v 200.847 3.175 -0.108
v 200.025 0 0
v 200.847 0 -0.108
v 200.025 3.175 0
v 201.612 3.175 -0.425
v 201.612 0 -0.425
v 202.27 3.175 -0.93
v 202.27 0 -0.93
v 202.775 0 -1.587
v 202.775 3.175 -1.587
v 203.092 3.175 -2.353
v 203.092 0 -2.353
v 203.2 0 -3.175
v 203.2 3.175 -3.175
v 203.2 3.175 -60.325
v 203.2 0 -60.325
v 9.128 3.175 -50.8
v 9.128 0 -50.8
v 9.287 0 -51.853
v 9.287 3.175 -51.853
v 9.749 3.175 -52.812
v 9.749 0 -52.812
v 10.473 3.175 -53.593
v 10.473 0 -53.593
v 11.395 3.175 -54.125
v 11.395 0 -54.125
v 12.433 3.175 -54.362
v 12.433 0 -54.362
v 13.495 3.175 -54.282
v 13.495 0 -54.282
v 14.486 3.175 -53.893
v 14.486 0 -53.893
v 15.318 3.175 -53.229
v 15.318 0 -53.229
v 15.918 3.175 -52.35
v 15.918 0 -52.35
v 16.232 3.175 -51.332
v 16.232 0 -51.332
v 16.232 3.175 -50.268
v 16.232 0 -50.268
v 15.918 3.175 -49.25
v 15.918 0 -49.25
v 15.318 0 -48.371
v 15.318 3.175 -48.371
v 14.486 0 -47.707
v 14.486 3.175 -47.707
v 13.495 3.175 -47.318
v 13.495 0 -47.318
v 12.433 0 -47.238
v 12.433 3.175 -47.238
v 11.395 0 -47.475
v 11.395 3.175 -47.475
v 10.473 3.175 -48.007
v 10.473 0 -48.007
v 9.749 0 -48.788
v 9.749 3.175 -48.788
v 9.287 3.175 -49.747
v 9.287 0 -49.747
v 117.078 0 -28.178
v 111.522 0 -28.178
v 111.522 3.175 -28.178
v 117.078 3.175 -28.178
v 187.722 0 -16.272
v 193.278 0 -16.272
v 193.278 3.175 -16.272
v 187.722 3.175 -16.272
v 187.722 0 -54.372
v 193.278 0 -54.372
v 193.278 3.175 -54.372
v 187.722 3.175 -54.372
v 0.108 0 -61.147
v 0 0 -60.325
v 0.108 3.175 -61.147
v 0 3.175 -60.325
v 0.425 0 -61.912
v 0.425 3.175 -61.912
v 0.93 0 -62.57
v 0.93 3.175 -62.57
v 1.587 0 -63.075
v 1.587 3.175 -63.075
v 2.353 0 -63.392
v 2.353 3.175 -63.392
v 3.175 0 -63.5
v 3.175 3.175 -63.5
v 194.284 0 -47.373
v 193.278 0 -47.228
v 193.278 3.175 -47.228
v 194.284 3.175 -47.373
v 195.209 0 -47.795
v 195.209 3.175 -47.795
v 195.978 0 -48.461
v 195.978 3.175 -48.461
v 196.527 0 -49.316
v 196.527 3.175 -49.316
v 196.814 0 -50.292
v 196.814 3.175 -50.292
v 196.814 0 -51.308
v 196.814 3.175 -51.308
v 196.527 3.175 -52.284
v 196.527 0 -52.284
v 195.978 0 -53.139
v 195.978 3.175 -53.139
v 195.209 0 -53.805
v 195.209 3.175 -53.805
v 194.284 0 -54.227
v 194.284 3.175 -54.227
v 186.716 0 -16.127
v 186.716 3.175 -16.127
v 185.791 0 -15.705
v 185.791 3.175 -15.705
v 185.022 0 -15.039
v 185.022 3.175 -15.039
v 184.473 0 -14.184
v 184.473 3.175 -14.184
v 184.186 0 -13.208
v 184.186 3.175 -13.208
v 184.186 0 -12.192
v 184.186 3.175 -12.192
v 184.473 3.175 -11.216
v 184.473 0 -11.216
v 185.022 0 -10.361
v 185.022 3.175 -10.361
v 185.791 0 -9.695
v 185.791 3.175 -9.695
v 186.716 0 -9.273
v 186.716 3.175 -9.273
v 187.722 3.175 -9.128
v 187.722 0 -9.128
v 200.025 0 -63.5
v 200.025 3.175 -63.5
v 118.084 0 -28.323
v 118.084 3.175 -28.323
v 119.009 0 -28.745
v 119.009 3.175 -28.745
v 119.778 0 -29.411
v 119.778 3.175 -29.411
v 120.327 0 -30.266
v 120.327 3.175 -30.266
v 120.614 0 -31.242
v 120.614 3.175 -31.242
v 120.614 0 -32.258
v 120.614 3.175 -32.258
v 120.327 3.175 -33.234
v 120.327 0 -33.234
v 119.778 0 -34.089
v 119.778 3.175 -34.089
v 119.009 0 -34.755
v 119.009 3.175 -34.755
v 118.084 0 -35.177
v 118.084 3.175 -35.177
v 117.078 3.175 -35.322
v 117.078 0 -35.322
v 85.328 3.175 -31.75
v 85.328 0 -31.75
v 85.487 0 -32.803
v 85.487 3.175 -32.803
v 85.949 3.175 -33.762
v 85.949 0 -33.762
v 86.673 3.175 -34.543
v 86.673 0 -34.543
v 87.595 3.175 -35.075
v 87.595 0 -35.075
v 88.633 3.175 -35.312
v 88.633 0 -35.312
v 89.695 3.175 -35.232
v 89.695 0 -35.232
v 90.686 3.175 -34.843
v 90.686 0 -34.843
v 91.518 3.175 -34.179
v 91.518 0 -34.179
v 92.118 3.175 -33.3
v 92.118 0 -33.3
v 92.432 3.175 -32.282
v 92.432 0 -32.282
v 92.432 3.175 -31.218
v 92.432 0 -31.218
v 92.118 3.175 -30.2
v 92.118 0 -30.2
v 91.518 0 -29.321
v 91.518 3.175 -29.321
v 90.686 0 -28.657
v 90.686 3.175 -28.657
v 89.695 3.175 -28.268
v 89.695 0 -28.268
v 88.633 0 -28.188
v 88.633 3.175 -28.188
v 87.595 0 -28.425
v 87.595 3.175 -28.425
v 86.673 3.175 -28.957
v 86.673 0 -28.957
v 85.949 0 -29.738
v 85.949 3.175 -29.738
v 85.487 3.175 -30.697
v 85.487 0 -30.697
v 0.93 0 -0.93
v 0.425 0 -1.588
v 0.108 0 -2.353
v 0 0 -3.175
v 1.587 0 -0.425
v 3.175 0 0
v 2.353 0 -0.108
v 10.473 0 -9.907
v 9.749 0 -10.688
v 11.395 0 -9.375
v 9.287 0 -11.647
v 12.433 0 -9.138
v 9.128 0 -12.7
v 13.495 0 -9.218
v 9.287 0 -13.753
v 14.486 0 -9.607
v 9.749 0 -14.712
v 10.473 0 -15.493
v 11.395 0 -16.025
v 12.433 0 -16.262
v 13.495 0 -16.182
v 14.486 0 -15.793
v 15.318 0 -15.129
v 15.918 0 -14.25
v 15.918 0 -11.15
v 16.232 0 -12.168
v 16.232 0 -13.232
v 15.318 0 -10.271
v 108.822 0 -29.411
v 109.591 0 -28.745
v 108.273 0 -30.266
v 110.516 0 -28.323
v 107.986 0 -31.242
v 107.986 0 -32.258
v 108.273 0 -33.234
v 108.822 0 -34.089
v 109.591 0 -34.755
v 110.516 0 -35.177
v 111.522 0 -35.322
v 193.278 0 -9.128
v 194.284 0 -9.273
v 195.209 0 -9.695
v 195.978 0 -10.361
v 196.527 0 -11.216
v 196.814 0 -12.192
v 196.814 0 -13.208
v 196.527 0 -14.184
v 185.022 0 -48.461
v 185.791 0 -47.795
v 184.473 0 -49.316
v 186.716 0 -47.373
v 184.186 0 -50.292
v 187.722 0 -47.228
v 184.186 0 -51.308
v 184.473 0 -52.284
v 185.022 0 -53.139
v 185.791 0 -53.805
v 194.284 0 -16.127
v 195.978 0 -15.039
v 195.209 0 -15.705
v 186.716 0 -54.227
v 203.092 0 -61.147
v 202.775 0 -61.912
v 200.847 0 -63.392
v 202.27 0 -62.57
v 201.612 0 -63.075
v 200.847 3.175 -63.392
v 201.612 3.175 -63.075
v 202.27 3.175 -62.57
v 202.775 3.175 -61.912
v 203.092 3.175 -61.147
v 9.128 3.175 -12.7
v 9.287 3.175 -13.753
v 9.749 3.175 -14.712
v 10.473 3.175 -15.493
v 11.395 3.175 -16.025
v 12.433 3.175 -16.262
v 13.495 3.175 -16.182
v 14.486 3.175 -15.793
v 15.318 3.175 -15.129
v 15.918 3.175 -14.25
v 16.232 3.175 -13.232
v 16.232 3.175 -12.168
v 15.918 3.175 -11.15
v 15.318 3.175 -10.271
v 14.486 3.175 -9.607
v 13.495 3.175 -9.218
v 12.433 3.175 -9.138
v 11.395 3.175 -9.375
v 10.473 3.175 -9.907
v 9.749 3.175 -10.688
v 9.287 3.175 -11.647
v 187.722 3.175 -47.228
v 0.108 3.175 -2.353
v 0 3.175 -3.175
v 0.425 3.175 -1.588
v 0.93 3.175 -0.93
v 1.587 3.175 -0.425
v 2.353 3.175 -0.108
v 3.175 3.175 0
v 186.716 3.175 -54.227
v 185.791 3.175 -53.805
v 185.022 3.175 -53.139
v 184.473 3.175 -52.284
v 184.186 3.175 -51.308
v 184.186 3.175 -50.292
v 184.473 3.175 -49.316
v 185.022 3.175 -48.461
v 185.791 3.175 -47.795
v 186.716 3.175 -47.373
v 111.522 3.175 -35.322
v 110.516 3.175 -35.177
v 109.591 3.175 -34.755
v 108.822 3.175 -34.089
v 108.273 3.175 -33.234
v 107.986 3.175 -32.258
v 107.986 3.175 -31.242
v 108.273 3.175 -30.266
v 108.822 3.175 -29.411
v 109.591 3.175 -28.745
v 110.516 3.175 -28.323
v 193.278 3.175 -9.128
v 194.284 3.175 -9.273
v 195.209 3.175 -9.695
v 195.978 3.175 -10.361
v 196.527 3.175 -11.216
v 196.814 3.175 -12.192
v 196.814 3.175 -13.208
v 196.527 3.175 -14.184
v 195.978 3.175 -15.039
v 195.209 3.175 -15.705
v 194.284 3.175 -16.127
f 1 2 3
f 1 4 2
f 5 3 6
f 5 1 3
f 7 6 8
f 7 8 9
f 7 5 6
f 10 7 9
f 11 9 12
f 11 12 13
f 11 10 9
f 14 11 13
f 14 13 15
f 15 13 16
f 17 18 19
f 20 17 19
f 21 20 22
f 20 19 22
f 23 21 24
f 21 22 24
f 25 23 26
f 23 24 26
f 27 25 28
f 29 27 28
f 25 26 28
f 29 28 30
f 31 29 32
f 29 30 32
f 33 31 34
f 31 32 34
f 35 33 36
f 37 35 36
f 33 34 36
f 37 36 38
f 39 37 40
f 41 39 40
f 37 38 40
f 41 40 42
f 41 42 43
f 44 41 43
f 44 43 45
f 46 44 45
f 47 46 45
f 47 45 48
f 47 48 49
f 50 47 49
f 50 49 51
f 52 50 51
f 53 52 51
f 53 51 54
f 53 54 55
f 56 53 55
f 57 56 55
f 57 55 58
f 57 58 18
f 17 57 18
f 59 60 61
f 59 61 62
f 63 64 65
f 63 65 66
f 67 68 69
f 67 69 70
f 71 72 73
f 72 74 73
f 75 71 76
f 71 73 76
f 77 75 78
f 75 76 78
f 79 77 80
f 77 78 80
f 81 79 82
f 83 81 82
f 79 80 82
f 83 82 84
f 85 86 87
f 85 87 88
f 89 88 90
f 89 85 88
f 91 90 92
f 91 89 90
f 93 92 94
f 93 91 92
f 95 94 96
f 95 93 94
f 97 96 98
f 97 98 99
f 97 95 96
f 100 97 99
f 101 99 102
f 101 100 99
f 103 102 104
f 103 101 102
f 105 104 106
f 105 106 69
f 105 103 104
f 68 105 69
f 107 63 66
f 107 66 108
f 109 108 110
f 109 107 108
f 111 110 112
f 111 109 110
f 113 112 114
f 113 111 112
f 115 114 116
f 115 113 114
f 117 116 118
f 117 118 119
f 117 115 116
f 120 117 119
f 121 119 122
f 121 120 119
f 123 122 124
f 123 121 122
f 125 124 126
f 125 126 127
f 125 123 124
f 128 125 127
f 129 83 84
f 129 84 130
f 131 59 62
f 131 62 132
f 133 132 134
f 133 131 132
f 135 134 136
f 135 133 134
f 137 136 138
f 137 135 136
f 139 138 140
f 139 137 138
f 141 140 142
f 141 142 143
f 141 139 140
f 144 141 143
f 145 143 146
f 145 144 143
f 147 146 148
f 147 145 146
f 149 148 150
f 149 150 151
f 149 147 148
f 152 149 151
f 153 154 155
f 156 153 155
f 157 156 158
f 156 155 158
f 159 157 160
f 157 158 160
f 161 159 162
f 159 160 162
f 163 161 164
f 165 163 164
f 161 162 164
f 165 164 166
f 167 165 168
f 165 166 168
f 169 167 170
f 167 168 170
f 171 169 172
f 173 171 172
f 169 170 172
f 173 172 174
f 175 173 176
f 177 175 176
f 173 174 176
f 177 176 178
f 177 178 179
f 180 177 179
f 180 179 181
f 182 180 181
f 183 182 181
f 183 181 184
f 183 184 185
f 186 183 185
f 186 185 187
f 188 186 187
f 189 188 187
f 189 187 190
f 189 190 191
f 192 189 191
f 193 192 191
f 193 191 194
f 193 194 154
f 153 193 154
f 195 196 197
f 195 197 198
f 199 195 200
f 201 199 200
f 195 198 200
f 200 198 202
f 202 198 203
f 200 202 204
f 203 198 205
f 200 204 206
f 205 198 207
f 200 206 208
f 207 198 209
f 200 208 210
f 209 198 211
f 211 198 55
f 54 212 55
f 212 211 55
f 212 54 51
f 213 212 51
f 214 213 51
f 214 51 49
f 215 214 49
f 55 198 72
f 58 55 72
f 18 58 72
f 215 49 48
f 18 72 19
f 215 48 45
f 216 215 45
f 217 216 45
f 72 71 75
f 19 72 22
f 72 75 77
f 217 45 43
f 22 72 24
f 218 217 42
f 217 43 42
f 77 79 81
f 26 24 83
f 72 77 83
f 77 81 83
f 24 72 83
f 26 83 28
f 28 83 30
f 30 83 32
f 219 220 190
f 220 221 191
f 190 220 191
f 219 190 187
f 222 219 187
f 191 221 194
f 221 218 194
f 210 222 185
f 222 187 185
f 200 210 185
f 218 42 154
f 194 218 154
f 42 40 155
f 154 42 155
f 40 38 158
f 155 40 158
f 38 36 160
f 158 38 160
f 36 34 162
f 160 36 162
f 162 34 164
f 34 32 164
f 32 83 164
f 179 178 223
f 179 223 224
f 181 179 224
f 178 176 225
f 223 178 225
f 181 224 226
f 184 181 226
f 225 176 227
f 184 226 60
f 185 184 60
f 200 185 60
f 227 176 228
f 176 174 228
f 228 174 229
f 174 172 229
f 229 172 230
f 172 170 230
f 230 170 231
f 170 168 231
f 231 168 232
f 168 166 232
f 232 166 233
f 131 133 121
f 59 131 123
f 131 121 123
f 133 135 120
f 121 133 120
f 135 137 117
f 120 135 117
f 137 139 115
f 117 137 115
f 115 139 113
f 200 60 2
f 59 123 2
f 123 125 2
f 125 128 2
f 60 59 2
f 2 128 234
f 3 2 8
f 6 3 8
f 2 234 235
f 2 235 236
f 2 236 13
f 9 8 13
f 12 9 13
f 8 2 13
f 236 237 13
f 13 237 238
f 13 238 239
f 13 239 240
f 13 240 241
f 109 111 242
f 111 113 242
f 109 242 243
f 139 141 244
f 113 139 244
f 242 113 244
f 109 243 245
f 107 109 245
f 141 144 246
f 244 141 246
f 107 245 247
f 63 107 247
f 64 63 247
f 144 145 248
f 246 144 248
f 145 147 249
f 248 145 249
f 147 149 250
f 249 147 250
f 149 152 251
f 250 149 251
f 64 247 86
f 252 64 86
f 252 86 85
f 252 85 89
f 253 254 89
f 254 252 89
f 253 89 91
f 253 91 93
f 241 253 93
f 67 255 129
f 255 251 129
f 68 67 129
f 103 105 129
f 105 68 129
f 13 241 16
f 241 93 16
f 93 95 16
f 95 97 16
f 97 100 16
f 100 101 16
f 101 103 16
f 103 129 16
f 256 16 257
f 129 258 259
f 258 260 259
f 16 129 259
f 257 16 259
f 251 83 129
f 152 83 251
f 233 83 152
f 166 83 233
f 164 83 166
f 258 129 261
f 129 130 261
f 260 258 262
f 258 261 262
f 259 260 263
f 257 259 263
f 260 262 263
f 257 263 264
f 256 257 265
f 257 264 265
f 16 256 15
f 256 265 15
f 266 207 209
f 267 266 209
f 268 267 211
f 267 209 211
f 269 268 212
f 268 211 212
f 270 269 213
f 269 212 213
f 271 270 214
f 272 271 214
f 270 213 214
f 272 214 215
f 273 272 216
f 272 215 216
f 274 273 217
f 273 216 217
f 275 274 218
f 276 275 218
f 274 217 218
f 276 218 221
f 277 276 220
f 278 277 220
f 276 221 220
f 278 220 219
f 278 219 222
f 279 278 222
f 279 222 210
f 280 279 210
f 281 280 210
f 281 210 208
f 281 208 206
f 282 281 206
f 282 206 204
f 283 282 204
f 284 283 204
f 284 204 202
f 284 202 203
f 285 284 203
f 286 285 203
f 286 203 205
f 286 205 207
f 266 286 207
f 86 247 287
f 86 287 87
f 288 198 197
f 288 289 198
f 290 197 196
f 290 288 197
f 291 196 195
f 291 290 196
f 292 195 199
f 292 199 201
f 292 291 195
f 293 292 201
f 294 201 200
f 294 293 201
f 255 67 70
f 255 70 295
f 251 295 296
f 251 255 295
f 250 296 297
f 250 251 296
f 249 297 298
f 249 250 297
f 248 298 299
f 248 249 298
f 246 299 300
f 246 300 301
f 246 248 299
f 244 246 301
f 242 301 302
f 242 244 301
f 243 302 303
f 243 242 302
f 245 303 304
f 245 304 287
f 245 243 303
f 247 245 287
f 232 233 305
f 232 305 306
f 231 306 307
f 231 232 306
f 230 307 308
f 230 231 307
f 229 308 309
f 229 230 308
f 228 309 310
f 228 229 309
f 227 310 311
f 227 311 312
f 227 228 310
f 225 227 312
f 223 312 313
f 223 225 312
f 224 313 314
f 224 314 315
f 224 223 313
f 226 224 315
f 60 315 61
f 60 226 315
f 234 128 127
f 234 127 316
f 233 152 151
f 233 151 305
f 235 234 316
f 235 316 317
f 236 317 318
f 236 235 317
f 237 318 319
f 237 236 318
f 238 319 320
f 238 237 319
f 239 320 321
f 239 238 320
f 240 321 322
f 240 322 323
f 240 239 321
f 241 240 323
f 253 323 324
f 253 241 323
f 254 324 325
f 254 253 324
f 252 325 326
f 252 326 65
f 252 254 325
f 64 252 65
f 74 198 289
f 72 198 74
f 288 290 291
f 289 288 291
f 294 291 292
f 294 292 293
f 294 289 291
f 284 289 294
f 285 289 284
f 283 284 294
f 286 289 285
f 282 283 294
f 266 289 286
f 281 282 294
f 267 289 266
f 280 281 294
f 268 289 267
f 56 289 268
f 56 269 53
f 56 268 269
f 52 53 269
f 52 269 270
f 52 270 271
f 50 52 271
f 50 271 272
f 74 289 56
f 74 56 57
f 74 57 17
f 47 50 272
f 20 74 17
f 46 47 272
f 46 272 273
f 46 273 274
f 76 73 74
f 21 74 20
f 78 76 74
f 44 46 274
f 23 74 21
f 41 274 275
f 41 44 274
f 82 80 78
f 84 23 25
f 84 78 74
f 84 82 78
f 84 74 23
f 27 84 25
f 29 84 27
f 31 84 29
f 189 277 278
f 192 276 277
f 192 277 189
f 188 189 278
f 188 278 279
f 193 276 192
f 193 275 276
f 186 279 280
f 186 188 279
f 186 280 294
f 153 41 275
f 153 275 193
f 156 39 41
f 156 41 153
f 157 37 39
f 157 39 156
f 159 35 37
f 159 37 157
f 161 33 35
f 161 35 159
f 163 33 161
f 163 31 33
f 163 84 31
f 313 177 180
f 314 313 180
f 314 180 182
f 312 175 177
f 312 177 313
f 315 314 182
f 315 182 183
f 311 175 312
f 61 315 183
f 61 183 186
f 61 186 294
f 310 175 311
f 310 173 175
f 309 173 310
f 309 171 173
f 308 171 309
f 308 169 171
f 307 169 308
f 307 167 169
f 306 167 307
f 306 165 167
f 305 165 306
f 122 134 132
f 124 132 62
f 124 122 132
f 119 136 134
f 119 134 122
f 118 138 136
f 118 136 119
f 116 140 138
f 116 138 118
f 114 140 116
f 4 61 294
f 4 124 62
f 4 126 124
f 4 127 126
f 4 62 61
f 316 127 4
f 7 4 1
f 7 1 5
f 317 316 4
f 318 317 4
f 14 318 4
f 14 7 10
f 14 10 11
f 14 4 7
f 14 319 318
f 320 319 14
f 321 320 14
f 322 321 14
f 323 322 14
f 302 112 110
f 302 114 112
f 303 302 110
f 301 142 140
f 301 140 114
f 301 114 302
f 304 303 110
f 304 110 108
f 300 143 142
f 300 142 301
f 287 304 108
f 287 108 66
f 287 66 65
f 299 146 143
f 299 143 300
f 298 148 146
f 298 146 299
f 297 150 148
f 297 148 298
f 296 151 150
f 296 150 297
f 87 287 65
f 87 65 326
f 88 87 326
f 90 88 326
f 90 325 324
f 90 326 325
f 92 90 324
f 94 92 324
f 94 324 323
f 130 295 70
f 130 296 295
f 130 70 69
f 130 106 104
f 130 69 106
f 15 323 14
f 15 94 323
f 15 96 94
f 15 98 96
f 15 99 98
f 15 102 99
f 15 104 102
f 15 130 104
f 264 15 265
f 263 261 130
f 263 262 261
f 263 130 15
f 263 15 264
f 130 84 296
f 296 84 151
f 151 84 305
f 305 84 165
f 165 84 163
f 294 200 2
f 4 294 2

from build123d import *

# Parameters (mm, degrees)
SKETCH1_W                           = 203.2
SKETCH1_H                           = 63.5
BOSS_EXTRUDE1_DEPTH                 = 3.175
F_9_32_0_28125_DIAMETER_HOLE1_D     = 7.14375
F_9_32_0_28125_DIAMETER_SLOT1_DEPTH = 3.175
FILLET1_R                           = 3.175


# Read off the part's stored shape, not the designer's step: 9/32 (0.28125) Diameter Slot1
with BuildPart() as part:
    # Sketch1 → Boss-Extrude1 (new body)
    with BuildSketch(Plane(origin=(0, 0, 0), x_dir=(1, 0, 0), z_dir=(0, 1, 0))):
        with Locations((101.6, 31.75)):
            Rectangle(SKETCH1_W, SKETCH1_H)
    extrude(amount=BOSS_EXTRUDE1_DEPTH)

    # 9/32 (0.28125) Diameter Hole1 (through all)
    with Locations(Plane(origin=(0, 3.175, 0), x_dir=(1, 0, 0), z_dir=(0, 1, 0))):
        with Locations((12.7, 12.7), (12.7, 50.8), (88.9, 31.75)):
            Hole(F_9_32_0_28125_DIAMETER_HOLE1_D / 2)

    # 9/32 (0.28125) Diameter Slot1 outline → 9/32 (0.28125) Diameter Slot1 (cut)
    with BuildSketch(Plane(origin=(0, 0, 0), x_dir=(1, 0, 0), z_dir=(0, 1, 0))):
        with BuildLine():
            Line((187.721875, 9.128125), (193.278125, 9.128125))
            ThreePointArc((193.278125, 9.128125), (196.85, 12.7), (193.278125, 16.271875))
            Line((193.278125, 16.271875), (187.721875, 16.271875))
            ThreePointArc((187.721875, 16.271875), (184.15, 12.7), (187.721875, 9.128125))
        make_face()
        with BuildLine():
            Line((187.721875, 47.228125), (193.278125, 47.228125))
            ThreePointArc((193.278125, 47.228125), (196.85, 50.8), (193.278125, 54.371875))
            Line((193.278125, 54.371875), (187.721875, 54.371875))
            ThreePointArc((187.721875, 54.371875), (184.15, 50.8), (187.721875, 47.228125))
        make_face()
        with BuildLine():
            Line((111.521875, 28.178125), (117.078125, 28.178125))
            ThreePointArc((117.078125, 28.178125), (120.65, 31.75), (117.078125, 35.321875))
            Line((117.078125, 35.321875), (111.521875, 35.321875))
            ThreePointArc((111.521875, 35.321875), (107.95, 31.75), (111.521875, 28.178125))
        make_face()
    extrude(amount=F_9_32_0_28125_DIAMETER_SLOT1_DEPTH, mode=Mode.SUBTRACT)

    # Fillet1
    fillet1_edges = [part.edges().sort_by_distance(p)[0] for p in [
        (0, 1.5875, -63.5),
        (203.2, 1.5875, -63.5),
        (203.2, 1.5875, 0),
        (0, 1.5875, 0),
    ]]
    fillet(fillet1_edges, radius=FILLET1_R)


solid = part.part
